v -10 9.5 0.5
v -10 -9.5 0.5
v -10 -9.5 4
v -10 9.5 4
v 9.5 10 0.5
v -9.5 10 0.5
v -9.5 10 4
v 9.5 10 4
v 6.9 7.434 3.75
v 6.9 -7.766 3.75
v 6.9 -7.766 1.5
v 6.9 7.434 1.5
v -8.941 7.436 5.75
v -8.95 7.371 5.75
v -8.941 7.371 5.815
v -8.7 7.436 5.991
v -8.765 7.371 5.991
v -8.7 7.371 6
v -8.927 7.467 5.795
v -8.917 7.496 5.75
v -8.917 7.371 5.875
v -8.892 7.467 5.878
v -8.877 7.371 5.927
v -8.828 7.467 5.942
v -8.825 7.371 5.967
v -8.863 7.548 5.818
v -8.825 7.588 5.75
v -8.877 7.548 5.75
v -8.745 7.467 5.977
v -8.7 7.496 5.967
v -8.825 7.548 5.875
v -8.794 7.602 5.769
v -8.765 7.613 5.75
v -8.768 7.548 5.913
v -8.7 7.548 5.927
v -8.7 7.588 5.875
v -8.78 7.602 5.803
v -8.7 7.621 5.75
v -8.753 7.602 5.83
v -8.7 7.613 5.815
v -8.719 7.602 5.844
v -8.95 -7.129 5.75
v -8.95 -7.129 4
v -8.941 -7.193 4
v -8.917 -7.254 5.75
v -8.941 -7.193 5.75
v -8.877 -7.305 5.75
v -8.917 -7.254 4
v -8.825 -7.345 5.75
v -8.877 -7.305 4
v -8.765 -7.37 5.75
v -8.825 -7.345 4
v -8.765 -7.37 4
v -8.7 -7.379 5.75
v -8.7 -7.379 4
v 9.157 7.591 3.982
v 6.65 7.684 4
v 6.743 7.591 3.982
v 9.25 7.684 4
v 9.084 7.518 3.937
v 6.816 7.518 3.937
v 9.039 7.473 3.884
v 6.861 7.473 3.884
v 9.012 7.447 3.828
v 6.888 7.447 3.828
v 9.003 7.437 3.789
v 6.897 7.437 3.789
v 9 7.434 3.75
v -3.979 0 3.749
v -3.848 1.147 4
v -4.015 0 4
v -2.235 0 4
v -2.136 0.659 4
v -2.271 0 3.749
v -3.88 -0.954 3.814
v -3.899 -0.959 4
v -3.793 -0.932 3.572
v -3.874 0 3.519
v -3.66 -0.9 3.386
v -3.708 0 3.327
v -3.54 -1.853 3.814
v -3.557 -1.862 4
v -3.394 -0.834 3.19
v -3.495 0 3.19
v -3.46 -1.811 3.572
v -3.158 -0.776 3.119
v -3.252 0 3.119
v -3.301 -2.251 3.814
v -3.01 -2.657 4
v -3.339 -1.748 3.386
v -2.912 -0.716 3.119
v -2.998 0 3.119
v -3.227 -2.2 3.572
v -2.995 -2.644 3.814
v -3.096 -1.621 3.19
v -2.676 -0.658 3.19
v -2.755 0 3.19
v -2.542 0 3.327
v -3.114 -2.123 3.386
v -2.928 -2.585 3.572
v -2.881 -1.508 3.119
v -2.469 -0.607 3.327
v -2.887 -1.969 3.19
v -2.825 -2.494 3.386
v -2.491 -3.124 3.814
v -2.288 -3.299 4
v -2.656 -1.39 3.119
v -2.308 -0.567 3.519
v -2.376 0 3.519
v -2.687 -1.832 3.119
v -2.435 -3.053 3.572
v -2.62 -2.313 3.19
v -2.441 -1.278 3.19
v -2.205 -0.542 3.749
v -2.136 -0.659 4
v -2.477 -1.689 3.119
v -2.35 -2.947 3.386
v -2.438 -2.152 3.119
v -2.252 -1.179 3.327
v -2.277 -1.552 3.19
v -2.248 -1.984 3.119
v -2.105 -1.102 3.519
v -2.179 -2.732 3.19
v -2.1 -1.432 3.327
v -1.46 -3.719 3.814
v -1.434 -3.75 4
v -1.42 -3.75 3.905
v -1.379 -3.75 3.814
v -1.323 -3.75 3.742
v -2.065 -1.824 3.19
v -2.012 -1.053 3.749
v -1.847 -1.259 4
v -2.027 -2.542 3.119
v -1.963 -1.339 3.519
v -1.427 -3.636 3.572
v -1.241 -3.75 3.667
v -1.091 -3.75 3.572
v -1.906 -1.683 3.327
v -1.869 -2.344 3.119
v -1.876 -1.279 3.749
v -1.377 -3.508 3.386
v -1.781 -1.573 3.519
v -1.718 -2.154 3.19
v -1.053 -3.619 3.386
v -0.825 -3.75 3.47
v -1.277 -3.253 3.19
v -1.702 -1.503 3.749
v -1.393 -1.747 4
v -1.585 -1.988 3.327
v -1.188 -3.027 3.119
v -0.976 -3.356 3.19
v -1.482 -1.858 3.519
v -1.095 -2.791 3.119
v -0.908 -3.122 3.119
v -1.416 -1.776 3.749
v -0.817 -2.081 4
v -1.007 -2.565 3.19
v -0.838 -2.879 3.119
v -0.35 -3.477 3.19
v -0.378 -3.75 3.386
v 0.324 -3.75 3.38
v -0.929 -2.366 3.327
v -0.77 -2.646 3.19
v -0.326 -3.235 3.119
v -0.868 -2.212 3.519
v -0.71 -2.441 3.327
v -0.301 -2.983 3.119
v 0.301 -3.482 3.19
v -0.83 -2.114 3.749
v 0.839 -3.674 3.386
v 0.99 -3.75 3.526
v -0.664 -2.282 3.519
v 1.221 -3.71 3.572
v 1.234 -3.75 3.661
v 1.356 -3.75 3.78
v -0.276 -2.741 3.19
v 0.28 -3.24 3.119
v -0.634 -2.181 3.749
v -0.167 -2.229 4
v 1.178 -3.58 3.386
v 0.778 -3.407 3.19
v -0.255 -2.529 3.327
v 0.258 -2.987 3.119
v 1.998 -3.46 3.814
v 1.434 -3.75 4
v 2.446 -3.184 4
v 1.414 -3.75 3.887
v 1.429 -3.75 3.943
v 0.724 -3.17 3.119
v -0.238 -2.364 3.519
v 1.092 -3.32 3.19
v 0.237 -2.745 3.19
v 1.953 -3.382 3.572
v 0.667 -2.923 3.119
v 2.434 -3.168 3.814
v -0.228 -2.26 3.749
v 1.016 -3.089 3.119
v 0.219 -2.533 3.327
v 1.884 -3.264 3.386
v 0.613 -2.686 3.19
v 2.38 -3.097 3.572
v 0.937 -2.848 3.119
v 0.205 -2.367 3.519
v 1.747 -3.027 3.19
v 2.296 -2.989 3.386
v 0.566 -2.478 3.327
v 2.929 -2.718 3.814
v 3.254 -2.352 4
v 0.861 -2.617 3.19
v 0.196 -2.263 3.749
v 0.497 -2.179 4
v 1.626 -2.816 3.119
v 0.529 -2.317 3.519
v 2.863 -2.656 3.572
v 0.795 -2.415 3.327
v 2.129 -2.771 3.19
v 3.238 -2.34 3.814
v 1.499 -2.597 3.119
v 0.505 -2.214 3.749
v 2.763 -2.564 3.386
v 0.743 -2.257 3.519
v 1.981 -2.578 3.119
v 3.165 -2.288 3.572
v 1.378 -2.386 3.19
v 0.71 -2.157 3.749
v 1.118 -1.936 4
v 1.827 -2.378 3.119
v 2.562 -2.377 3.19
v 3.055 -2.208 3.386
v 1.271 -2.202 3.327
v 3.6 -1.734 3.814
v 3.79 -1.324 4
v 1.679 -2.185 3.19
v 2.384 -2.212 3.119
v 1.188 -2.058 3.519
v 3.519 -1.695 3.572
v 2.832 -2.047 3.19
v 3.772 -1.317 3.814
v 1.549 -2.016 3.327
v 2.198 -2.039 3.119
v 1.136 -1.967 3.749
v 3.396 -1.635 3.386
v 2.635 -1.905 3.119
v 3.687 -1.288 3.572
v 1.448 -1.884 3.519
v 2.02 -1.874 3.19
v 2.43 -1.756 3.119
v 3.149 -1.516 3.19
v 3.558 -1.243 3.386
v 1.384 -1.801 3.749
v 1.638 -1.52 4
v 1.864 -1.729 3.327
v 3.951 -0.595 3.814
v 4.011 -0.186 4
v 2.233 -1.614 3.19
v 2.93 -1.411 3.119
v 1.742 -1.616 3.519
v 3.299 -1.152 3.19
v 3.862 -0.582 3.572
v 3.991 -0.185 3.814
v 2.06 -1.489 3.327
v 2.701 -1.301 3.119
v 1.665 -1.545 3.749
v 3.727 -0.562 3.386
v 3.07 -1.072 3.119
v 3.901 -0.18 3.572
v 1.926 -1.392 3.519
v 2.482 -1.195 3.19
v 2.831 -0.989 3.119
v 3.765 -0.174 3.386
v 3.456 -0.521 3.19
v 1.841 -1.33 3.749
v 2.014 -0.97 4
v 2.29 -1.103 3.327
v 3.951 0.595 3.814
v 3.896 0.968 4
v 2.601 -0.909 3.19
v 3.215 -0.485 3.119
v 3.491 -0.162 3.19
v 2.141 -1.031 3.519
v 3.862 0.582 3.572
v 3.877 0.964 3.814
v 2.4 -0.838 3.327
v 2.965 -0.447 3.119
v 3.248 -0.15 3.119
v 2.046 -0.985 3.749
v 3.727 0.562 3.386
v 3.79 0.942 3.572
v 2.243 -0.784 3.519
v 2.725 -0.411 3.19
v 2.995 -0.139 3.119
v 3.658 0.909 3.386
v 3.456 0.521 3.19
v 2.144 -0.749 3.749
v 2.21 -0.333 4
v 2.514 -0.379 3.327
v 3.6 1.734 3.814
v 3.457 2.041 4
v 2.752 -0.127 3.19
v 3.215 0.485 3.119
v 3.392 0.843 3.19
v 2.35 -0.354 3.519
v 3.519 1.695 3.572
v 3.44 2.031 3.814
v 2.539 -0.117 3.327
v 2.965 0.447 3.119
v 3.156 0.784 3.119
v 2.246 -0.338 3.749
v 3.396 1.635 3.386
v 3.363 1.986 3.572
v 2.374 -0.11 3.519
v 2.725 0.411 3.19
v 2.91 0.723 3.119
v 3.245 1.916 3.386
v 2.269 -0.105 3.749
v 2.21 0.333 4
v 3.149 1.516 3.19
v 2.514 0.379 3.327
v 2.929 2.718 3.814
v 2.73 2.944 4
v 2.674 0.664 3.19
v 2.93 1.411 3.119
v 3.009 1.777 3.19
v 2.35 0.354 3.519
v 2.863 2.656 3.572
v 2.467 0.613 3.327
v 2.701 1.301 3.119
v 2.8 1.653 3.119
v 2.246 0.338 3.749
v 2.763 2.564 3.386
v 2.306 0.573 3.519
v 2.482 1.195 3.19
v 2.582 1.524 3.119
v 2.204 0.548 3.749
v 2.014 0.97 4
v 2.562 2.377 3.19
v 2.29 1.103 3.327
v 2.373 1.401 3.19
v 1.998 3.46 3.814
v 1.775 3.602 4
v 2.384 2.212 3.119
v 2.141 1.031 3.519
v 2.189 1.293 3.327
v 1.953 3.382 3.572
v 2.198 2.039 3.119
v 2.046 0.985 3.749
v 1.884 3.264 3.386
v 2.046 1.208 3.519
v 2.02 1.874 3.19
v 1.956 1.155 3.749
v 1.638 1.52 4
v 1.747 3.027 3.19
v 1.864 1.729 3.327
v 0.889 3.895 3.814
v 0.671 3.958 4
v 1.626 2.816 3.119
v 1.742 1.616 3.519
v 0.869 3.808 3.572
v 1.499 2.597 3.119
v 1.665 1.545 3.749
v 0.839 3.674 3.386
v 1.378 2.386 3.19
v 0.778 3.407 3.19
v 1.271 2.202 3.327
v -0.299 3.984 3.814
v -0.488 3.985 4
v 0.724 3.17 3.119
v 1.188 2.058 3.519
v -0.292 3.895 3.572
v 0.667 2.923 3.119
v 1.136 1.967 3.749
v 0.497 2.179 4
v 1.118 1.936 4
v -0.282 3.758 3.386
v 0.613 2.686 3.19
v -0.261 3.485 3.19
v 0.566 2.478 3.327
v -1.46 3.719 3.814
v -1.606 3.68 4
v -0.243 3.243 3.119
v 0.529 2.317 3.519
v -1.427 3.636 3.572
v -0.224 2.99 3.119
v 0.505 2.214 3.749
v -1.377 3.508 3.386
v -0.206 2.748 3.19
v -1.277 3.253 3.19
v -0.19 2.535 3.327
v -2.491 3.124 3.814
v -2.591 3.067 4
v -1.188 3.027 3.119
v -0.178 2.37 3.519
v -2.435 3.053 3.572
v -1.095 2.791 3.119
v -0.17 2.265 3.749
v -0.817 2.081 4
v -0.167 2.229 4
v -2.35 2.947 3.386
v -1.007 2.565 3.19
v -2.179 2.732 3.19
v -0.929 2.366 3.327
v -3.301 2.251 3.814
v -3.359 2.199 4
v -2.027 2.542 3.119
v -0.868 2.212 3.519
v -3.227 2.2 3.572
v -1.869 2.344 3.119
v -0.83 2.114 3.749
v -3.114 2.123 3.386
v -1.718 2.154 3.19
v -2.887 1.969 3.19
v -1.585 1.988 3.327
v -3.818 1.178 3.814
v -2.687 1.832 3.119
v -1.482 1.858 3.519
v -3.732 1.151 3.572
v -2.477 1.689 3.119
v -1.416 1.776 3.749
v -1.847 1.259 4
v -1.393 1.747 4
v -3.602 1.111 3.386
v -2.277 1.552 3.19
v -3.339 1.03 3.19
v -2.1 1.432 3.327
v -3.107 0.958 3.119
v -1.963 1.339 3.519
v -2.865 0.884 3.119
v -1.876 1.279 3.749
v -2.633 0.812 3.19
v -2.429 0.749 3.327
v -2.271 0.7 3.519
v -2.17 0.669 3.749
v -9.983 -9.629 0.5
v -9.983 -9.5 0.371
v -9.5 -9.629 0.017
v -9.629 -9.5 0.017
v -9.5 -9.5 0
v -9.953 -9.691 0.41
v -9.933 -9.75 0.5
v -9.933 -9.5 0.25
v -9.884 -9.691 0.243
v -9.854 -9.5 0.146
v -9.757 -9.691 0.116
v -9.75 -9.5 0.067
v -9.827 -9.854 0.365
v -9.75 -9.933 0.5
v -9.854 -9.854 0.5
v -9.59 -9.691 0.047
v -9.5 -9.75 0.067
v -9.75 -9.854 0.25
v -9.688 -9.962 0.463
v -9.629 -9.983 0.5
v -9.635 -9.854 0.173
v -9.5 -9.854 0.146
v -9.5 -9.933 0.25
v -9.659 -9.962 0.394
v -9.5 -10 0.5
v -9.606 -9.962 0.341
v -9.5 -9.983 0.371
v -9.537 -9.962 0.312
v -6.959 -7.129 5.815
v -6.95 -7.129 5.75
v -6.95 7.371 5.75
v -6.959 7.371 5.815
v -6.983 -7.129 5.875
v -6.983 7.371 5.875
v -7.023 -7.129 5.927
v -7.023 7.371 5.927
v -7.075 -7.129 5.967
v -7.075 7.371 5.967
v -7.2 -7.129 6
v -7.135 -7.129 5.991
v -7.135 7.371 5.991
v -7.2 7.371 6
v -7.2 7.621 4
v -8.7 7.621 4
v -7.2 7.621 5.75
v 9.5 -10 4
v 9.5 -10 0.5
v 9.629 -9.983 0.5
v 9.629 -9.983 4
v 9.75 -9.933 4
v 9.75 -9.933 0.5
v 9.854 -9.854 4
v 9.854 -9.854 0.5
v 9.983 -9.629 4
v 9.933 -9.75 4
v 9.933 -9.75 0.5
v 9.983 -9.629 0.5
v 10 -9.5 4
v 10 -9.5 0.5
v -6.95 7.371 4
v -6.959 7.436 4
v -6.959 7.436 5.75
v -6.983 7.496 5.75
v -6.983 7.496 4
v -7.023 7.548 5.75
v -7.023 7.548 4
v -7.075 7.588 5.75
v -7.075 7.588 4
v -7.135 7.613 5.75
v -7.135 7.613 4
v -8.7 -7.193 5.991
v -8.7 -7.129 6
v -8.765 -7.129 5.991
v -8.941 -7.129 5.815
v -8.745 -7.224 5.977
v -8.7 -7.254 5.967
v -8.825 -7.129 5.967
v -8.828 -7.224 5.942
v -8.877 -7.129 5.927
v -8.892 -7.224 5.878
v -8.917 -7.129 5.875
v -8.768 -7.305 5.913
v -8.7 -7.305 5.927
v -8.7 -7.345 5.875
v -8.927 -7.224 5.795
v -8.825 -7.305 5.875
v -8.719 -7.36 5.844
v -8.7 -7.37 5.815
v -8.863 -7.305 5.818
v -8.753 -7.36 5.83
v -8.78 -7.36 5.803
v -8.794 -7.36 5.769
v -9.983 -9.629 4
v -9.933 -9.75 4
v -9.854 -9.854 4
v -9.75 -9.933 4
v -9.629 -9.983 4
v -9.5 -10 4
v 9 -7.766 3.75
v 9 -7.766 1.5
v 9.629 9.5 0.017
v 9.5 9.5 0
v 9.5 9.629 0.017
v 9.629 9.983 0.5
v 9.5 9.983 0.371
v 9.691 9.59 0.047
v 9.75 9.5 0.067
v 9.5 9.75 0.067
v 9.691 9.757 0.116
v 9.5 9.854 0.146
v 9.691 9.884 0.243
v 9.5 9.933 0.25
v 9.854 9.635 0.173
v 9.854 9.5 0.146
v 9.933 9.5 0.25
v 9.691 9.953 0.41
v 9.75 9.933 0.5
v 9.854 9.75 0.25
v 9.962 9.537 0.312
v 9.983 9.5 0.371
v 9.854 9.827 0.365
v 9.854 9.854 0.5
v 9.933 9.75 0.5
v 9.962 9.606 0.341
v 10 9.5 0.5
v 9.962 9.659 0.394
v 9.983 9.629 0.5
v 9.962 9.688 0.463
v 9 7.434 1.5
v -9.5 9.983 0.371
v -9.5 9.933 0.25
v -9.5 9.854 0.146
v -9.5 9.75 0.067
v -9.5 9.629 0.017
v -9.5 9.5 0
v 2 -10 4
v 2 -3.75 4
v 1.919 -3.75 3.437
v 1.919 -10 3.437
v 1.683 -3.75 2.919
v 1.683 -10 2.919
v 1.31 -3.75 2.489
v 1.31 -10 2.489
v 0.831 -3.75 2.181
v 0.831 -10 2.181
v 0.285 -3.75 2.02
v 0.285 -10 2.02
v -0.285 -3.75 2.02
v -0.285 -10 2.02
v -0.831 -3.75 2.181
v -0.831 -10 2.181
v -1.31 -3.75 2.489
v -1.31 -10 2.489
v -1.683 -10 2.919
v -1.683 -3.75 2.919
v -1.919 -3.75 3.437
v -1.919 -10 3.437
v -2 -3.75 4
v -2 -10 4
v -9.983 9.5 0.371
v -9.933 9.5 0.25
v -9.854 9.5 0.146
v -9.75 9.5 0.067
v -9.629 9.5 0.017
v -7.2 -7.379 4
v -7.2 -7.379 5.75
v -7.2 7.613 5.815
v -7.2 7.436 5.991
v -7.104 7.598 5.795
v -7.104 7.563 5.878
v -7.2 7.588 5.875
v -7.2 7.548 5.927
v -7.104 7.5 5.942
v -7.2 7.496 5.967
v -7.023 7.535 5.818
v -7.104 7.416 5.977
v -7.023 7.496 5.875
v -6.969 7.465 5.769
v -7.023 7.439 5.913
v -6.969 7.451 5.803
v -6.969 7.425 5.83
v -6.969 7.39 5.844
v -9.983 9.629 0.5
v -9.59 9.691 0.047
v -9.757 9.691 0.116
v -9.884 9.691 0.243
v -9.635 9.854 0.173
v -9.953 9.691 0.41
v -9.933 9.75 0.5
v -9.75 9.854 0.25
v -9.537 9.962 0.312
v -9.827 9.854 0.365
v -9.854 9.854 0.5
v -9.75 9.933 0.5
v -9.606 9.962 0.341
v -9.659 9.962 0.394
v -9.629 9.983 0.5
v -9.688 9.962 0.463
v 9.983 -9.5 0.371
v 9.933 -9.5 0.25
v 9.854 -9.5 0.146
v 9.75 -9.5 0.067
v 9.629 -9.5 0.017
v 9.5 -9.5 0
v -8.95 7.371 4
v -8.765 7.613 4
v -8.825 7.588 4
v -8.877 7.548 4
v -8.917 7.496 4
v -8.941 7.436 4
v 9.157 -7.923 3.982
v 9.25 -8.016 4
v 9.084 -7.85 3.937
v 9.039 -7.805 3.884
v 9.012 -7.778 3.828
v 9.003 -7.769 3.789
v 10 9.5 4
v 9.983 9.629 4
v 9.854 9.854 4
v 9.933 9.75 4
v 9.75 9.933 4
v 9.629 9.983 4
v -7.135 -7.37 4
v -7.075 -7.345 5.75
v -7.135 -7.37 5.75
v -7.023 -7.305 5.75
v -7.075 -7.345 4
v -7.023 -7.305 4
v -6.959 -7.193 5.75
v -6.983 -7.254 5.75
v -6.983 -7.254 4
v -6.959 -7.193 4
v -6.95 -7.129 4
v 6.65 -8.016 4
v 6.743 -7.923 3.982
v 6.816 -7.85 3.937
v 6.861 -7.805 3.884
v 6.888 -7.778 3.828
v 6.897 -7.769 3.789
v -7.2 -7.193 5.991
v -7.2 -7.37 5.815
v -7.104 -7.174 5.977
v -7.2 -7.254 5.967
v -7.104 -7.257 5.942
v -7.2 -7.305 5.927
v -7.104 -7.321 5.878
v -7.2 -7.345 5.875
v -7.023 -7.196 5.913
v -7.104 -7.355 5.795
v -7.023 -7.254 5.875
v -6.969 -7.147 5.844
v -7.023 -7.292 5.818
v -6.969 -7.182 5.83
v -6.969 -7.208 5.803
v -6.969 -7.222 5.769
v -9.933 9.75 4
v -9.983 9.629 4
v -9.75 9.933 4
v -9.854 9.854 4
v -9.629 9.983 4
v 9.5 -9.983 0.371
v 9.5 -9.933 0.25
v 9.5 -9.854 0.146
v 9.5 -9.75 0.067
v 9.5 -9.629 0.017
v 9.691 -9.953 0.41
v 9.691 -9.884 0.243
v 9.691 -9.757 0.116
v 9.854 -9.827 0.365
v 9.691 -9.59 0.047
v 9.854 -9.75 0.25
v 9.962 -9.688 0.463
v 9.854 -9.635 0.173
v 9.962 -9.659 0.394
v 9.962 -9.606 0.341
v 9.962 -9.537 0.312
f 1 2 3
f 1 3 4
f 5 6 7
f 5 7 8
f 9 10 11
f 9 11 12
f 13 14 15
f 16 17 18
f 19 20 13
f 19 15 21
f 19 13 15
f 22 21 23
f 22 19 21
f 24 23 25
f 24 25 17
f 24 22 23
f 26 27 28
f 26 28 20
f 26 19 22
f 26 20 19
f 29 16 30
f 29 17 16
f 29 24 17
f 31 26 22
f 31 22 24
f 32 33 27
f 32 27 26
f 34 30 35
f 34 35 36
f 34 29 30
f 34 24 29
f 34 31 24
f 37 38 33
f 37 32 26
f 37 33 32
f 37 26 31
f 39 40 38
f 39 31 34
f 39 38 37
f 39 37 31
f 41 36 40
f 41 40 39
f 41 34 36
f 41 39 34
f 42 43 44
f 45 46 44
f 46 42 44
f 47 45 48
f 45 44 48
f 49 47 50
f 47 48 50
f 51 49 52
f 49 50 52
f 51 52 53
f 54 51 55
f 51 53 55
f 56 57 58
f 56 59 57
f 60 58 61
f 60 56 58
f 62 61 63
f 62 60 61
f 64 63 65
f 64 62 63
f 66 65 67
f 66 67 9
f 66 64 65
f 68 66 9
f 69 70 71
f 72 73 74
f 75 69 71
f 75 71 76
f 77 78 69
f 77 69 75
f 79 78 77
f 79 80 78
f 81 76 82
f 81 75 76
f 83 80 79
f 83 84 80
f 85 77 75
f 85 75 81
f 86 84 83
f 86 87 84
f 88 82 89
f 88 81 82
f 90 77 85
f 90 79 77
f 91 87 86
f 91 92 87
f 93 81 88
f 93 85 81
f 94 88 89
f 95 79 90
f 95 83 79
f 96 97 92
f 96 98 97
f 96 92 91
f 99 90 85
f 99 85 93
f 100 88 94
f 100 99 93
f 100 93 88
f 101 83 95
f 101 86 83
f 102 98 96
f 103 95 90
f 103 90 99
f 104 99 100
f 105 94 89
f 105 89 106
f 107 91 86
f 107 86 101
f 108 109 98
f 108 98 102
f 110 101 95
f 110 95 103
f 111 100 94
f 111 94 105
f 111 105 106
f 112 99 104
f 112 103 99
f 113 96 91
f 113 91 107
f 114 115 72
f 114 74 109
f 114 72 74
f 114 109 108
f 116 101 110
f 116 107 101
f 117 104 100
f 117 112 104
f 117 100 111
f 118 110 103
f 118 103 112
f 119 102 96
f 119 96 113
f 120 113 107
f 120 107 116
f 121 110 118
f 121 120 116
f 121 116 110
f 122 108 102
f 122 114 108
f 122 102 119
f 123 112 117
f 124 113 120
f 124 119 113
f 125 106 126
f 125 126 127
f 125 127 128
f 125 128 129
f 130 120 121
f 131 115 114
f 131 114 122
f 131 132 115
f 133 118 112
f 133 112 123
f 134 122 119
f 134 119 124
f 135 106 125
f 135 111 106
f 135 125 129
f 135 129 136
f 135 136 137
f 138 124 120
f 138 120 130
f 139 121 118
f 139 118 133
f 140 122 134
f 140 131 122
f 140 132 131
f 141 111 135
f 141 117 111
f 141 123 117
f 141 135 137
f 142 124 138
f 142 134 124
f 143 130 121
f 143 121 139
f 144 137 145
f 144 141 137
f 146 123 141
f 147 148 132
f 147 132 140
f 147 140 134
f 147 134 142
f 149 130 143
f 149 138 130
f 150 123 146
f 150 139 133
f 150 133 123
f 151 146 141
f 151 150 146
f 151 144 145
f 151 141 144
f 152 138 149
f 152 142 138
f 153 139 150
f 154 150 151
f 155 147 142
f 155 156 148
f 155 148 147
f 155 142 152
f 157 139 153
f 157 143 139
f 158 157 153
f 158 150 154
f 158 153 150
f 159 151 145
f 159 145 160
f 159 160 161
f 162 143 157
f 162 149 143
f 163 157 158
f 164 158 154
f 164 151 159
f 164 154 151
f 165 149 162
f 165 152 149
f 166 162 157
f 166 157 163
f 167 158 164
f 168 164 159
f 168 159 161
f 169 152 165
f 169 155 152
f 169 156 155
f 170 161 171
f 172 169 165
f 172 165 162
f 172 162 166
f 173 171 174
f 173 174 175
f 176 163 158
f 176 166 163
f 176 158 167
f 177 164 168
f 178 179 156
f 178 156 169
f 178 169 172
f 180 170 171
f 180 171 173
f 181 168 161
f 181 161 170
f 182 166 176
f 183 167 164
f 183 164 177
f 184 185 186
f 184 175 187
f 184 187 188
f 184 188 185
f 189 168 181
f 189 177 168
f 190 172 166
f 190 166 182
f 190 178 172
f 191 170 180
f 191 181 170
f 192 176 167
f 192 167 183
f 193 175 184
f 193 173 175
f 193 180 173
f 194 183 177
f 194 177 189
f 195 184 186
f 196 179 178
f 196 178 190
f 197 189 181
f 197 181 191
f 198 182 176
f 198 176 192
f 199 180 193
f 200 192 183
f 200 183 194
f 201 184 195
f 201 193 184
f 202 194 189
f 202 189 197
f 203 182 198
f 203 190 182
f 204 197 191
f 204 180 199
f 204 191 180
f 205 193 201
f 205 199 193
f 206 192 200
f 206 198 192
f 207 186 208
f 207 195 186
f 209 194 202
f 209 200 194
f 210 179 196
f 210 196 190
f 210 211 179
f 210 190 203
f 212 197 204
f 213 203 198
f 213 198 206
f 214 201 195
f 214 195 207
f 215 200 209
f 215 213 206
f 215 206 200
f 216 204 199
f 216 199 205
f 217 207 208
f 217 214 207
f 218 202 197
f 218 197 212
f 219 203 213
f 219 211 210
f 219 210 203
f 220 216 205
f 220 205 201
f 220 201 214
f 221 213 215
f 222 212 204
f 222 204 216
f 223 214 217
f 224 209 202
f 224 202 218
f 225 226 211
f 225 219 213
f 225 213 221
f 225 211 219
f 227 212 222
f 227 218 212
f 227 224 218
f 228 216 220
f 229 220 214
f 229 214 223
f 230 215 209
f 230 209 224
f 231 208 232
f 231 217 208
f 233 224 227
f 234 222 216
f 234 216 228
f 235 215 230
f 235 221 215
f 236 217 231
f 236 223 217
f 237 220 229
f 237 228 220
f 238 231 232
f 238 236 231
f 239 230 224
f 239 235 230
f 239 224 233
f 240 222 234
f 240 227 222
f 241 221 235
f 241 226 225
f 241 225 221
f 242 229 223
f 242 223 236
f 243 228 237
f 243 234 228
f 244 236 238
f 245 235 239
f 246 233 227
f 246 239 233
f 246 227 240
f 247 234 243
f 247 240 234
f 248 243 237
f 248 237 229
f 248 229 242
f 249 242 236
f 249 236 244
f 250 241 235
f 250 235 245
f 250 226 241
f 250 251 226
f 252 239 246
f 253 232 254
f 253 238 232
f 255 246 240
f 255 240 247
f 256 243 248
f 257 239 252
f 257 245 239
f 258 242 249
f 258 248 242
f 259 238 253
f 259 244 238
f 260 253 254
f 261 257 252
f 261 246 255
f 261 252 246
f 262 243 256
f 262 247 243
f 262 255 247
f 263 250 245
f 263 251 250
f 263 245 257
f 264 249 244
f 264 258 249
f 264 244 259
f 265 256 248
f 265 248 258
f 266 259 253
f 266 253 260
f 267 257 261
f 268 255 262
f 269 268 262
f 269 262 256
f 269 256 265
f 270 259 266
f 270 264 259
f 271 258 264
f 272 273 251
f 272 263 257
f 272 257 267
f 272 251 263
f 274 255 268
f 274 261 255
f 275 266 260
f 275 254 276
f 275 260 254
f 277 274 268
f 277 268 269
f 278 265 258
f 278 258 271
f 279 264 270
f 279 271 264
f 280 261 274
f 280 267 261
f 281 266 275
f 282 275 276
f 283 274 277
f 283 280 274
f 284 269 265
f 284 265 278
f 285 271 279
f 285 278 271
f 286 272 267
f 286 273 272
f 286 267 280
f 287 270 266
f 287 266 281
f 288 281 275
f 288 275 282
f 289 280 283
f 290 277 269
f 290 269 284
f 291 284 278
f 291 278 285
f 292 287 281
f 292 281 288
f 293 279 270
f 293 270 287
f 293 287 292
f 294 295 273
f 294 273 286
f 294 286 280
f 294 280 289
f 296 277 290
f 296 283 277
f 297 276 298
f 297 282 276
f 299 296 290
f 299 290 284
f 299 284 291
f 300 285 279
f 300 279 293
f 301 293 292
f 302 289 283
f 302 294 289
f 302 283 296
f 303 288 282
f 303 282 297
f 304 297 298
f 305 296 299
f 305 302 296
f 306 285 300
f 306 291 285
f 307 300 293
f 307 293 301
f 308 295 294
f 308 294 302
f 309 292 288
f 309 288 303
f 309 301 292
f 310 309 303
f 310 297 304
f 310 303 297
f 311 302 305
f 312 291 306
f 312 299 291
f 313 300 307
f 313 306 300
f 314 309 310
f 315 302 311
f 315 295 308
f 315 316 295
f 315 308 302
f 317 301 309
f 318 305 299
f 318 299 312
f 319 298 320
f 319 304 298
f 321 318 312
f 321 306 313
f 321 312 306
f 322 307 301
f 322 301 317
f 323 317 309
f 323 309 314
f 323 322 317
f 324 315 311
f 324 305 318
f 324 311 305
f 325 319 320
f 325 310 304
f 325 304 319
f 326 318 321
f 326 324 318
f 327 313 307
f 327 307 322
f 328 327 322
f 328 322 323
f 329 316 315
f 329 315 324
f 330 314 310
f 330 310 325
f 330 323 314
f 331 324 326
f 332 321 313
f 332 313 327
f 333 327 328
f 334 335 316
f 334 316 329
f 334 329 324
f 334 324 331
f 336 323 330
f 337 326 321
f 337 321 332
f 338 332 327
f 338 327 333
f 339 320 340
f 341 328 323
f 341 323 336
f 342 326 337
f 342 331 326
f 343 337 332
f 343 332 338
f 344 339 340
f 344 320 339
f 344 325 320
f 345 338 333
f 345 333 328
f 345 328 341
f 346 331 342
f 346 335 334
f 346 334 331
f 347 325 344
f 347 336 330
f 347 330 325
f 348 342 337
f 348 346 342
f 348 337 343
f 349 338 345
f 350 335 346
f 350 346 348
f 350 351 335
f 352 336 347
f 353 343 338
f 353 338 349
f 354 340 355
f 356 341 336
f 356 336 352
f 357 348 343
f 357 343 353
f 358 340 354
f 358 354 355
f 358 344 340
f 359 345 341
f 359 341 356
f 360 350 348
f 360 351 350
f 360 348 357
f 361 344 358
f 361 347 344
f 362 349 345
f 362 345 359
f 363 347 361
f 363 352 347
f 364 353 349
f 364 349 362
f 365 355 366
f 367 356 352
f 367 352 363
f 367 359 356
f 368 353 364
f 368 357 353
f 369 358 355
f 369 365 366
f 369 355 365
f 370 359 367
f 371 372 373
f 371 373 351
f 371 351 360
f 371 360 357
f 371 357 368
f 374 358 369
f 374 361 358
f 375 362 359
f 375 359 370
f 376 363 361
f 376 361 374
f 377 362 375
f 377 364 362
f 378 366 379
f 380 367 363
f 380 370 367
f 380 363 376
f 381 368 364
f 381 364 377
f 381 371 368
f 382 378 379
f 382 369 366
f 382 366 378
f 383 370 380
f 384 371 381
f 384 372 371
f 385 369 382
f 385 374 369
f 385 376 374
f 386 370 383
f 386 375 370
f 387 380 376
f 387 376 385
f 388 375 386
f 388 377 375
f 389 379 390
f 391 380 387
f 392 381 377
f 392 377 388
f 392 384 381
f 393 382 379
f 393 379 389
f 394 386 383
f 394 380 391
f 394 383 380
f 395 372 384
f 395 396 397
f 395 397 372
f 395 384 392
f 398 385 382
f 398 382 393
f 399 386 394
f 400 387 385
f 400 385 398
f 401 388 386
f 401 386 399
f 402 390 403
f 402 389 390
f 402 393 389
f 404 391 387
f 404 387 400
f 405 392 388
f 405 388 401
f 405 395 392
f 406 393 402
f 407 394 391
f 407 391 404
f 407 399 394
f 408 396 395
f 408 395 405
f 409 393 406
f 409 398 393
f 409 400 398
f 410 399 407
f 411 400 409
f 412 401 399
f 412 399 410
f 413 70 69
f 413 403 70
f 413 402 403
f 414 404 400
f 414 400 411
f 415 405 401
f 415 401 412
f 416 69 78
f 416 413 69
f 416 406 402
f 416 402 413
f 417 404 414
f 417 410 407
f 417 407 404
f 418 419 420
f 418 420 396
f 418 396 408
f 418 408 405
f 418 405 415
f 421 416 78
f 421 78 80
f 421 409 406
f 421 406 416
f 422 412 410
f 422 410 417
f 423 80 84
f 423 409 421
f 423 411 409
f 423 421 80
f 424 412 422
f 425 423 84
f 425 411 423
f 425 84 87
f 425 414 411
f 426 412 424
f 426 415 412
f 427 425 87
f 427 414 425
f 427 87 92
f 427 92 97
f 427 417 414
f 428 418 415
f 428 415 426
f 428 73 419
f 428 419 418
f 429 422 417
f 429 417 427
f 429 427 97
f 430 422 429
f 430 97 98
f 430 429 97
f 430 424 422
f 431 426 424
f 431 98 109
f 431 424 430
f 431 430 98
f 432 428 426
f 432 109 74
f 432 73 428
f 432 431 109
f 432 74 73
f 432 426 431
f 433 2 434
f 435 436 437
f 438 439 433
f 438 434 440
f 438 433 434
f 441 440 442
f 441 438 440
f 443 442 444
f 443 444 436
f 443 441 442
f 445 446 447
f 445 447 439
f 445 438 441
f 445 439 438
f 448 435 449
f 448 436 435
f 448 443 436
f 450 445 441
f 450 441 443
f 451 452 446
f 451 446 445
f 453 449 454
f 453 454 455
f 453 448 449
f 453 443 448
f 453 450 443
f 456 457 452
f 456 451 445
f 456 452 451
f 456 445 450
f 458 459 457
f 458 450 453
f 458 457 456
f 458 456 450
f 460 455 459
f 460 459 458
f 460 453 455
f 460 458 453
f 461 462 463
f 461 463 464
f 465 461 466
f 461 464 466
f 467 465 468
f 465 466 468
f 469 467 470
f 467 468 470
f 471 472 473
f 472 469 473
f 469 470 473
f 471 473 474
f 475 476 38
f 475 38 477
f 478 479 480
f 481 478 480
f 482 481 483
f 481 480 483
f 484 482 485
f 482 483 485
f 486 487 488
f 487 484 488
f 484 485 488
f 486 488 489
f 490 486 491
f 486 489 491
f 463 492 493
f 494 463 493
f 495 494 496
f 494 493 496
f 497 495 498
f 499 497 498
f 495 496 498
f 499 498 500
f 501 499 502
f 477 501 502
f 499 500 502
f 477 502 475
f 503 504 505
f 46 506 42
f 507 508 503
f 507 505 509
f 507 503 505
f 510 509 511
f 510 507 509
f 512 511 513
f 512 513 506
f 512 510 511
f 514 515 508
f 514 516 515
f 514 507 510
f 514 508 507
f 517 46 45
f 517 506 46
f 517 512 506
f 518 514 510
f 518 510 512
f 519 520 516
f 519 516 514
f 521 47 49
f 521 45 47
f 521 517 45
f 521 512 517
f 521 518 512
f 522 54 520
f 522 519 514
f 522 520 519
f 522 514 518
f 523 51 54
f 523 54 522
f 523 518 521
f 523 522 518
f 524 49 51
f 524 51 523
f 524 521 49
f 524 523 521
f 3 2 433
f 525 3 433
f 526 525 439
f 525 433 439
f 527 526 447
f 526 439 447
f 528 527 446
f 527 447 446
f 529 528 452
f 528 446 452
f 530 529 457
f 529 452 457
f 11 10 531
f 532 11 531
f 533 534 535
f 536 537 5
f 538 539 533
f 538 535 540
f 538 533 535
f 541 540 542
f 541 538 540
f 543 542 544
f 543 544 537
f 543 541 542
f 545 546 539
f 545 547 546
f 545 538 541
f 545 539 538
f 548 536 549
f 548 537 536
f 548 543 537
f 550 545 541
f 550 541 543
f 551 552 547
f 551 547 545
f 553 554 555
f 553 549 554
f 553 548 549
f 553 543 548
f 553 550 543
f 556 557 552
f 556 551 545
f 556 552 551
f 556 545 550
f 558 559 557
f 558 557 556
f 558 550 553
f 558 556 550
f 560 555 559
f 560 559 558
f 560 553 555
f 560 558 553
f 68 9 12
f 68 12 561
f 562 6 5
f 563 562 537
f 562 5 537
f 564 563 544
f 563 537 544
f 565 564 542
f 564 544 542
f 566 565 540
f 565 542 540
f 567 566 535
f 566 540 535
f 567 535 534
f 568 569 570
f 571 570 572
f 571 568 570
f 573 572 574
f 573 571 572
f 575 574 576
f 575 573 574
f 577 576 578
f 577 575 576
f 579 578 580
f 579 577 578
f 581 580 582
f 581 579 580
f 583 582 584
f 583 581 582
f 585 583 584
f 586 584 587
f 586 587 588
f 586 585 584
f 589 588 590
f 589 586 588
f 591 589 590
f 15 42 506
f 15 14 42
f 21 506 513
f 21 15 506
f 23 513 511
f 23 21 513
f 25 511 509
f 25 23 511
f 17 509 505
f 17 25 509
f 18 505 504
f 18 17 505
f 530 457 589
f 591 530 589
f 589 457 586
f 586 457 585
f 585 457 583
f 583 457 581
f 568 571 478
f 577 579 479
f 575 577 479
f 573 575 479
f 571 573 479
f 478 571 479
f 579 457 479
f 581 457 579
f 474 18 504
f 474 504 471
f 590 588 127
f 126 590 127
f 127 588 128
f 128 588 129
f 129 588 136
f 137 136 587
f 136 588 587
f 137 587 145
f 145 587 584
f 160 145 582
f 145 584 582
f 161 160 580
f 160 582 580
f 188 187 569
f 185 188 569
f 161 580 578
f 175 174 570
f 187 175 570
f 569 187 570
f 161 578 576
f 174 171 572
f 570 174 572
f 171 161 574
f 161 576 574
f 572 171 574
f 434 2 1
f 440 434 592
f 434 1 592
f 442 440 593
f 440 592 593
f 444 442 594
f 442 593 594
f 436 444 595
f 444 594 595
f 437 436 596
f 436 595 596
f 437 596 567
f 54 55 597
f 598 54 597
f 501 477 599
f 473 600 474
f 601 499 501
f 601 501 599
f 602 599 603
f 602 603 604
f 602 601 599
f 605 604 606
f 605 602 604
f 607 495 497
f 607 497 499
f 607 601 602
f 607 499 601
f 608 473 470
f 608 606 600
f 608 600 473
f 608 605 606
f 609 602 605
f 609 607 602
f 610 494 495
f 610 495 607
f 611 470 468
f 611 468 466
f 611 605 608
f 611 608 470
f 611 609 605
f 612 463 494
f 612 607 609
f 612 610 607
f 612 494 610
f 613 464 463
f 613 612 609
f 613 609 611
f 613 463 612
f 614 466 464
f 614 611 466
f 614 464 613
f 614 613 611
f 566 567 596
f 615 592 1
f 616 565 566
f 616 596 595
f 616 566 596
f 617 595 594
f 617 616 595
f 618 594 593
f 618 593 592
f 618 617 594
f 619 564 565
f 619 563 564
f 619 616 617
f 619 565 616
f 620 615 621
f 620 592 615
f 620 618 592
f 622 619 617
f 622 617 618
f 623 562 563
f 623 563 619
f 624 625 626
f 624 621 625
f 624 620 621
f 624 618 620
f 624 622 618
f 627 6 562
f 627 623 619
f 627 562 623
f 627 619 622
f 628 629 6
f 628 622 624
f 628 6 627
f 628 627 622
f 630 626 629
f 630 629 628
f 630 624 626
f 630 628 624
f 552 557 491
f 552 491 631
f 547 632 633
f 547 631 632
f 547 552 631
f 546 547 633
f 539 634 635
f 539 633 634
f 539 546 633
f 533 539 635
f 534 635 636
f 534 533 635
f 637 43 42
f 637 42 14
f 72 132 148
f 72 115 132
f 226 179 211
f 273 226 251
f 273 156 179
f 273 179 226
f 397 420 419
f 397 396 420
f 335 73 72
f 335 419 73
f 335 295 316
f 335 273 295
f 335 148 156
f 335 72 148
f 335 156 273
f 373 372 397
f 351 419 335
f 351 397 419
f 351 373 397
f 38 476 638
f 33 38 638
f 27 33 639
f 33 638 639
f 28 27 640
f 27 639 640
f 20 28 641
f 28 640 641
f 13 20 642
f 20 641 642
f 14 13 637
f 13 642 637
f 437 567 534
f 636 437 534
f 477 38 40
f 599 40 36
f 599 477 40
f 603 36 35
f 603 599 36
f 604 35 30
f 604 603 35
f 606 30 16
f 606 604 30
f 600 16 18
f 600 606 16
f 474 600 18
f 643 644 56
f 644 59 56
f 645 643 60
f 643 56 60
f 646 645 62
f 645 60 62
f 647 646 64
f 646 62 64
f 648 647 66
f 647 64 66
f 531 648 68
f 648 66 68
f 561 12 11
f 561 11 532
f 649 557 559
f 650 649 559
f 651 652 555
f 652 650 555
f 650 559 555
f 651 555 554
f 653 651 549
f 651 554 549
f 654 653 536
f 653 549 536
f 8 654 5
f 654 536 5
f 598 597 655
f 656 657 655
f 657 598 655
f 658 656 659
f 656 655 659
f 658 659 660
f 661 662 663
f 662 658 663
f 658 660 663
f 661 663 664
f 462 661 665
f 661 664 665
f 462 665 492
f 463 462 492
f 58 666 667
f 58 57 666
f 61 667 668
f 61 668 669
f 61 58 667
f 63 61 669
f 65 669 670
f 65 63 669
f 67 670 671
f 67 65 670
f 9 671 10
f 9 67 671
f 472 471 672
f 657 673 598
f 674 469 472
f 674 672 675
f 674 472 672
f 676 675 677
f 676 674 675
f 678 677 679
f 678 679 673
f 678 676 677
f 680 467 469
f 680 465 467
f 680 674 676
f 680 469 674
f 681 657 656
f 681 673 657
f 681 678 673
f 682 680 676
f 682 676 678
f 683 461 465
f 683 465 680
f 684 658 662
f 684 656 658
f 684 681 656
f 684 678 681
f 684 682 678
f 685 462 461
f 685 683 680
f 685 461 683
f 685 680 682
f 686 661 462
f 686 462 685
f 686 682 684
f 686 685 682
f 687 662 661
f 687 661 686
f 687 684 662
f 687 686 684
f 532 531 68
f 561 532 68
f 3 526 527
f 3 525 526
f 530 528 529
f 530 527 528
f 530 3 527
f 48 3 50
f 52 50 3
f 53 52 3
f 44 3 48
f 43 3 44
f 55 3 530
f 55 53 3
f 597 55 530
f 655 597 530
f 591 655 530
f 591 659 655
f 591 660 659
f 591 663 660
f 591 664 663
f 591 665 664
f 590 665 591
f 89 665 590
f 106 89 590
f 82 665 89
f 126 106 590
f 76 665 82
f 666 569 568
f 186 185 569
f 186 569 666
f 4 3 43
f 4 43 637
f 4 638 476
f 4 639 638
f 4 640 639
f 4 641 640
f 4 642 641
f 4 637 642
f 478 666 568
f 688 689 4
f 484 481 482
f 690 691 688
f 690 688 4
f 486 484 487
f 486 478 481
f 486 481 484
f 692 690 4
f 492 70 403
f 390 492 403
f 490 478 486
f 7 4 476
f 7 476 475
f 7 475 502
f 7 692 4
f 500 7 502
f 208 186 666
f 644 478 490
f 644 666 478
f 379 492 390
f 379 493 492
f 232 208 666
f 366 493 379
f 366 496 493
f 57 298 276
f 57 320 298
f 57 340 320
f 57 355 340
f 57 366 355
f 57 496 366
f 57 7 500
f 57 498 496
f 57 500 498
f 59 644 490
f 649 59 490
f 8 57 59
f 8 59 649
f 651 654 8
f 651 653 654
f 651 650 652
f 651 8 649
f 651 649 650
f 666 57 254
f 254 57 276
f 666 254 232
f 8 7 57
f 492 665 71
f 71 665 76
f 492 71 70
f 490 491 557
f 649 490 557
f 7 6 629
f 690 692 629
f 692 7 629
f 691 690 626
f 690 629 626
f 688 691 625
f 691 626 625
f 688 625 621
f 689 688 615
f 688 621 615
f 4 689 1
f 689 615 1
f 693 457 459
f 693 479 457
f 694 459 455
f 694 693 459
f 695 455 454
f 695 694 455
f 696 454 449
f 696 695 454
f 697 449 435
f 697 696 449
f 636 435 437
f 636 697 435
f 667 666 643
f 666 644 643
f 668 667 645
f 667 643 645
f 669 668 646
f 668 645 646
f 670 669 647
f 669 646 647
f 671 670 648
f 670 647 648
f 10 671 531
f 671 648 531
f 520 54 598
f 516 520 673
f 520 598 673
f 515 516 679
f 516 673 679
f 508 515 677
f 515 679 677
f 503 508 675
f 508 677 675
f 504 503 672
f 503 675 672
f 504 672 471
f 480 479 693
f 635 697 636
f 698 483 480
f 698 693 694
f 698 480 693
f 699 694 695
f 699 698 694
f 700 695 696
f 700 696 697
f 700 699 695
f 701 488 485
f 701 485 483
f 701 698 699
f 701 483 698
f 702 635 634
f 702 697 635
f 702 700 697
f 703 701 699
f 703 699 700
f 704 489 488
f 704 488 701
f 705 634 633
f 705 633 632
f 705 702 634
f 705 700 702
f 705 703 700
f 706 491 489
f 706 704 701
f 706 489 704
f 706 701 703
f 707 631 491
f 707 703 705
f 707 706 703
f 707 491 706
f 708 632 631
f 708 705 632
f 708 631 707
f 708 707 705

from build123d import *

# Parameters (mm, degrees)
SKETCH1_W               = 20
SKETCH1_H               = 20
BOSS_EXTRUDE1_DEPTH     = 4
SKETCH4_R               = 0.89
CUT_EXTRUDE1_DEPTH      = 0.25
CUT_EXTRUDE1_DEPTH_BACK = 8
SKETCH6_R               = 2
SKETCH7_W               = 2
SKETCH7_H               = 15
BOSS_EXTRUDE2_DEPTH     = 2
SKETCH8_W               = 2.1
SKETCH8_H               = 15.2
CUT_EXTRUDE2_DEPTH      = 2.5
FILLET1_R               = 0.25
FILLET2_R               = 0.25
FILLET3_R               = 0.25
FILLET5_R               = 0.5
FILLET6_R               = 0.5


with BuildPart() as part:
    # Sketch1 → Boss-Extrude1 (new body)
    with BuildSketch(Plane.XY):
        Rectangle(SKETCH1_W, SKETCH1_H)
    extrude(amount=BOSS_EXTRUDE1_DEPTH)

    # Sketch4 → Cut-Revolve1 (revolve, cut)
    with BuildSketch(Plane(origin=(0, 0, 0), x_dir=(1, 0, 0), z_dir=(0, 1, 0)), mode=Mode.PRIVATE) as cut_revolve1_sk:
        with Locations((3.125, -4)):
            Circle(SKETCH4_R)
    revolve(cut_revolve1_sk.sketch.rotate(Axis((0, 0, 0), (0, 0, 1)), 180), axis=Axis((0, 0, 0), (0, 0, 1)), mode=Mode.SUBTRACT)

    # Sketch6 → Cut-Extrude1 (cut, two sides: drawn at the far end of the back side and taken through both)
    with BuildSketch(Plane(origin=(0, -4, 0), x_dir=(1, 0, 0), z_dir=(0, 1, 0)).offset(-CUT_EXTRUDE1_DEPTH_BACK)):
        with Locations((0, -4)):
            Circle(SKETCH6_R)
    extrude(amount=CUT_EXTRUDE1_DEPTH + CUT_EXTRUDE1_DEPTH_BACK, mode=Mode.SUBTRACT)

    # Sketch7 → Boss-Extrude2 (add)
    with BuildSketch(Plane.XY.offset(4)):
        with Locations((-7.95, 0.121431972)):
            Rectangle(SKETCH7_W, SKETCH7_H)
    extrude(amount=BOSS_EXTRUDE2_DEPTH)

    # Sketch8 → Cut-Extrude2 (cut)
    with BuildSketch(Plane.XY.offset(4)):
        with Locations((7.95, -0.165781366)):
            Rectangle(SKETCH8_W, SKETCH8_H)
    extrude(amount=-CUT_EXTRUDE2_DEPTH, mode=Mode.SUBTRACT)

    # Fillet1
    fillet1_edges = [part.edges().sort_by_distance(p)[0] for p in [
        (-8.95, 0.121431972, 6),
        (-7.95, -7.378568028, 6),
        (-6.95, 0.121431972, 6),
        (-7.95, 7.621431972, 6),
    ]]
    fillet(fillet1_edges, radius=FILLET1_R)

    # Fillet2
    # the kernel refuses this fillet: 0.25 mm, written as the material it takes off along each edge
    with BuildSketch(Plane(origin=(-7.2, -7.128568028, 5.75), x_dir=(0, -1, 0), z_dir=(1, 0, 0))) as fillet2_piece_1_section:
        Polygon((0, 0), (FILLET2_R, 0), (FILLET2_R, -FILLET2_R), (0, -FILLET2_R), align=None)
    fillet2_piece_1 = extrude(amount=FILLET2_R, mode=Mode.PRIVATE)
    fillet2_piece_1 = fillet2_piece_1 - Plane(origin=(-7.2, -7.128568028, 5.75), x_dir=(0, 0.7071067811865475, -0.7071067811865475), z_dir=(1, 0, 0)) * Sphere(FILLET2_R, mode=Mode.PRIVATE)
    add(fillet2_piece_1, mode=Mode.SUBTRACT)
    with BuildSketch(Plane(origin=(-8.7, -7.128568028, 5.75), x_dir=(-1, 0, 0), z_dir=(0, -1, 0))) as fillet2_piece_2_section:
        Polygon((0, 0), (FILLET2_R, 0), (FILLET2_R, -FILLET2_R), (0, -FILLET2_R), align=None)
    fillet2_piece_2 = extrude(amount=FILLET2_R, mode=Mode.PRIVATE)
    fillet2_piece_2 = fillet2_piece_2 - Plane(origin=(-8.7, -7.128568028, 5.75), x_dir=(0.7071067811865475, 0, -0.7071067811865475), z_dir=(0, -1, 0)) * Sphere(FILLET2_R, mode=Mode.PRIVATE)
    add(fillet2_piece_2, mode=Mode.SUBTRACT)
    with BuildSketch(Plane(origin=(-7.2, 7.371431972, 5.75), x_dir=(0, 1, 0), z_dir=(1, 0, 0))) as fillet2_piece_3_section:
        Polygon((0, 0), (FILLET2_R, 0), (FILLET2_R, FILLET2_R), (0, FILLET2_R), align=None)
    fillet2_piece_3 = extrude(amount=FILLET2_R, mode=Mode.PRIVATE)
    fillet2_piece_3 = fillet2_piece_3 - Plane(origin=(-7.2, 7.371431972, 5.75), x_dir=(0, -0.7071067811865475, -0.7071067811865475), z_dir=(1, 0, 0)) * Sphere(FILLET2_R, mode=Mode.PRIVATE)
    add(fillet2_piece_3, mode=Mode.SUBTRACT)
    with BuildSketch(Plane(origin=(-8.7, 7.371431972, 5.75), x_dir=(-1, 0, 0), z_dir=(0, 1, 0))) as fillet2_piece_4_section:
        Polygon((0, 0), (FILLET2_R, 0), (FILLET2_R, FILLET2_R), (0, FILLET2_R), align=None)
    fillet2_piece_4 = extrude(amount=FILLET2_R, mode=Mode.PRIVATE)
    fillet2_piece_4 = fillet2_piece_4 - Plane(origin=(-8.7, 7.371431972, 5.75), x_dir=(0.7071067811865475, 0, -0.7071067811865475), z_dir=(0, 1, 0)) * Sphere(FILLET2_R, mode=Mode.PRIVATE)
    add(fillet2_piece_4, mode=Mode.SUBTRACT)
    with BuildSketch(Plane(origin=(-8.95, 7.621431972, 4), x_dir=(1, 0, 0), z_dir=(0, 0, 1)), Plane(origin=(-6.95, 7.621431972, 4), x_dir=(0, -1, 0), z_dir=(0, 0, 1))) as fillet2_piece_5:
        with BuildLine():
            CenterArc((FILLET2_R, -FILLET2_R), FILLET2_R, 90, 90)
            Line((0, -FILLET2_R), (0, 0))
            Line((0, 0), (FILLET2_R, 0))
        make_face()
    extrude(amount=1.75, mode=Mode.SUBTRACT)
    with BuildSketch(Plane(origin=(-6.95, -7.378568028, 4), x_dir=(0, 1, 0), z_dir=(0, 0, 1)), Plane(origin=(-8.95, -7.378568028, 4), x_dir=(1, 0, 0), z_dir=(0, 0, 1))) as fillet2_piece_6:
        with BuildLine():
            CenterArc((FILLET2_R, FILLET2_R), FILLET2_R, 180, 90)
            Line((0, FILLET2_R), (0, 0))
            Line((0, 0), (FILLET2_R, 0))
        make_face()
    extrude(amount=1.75, mode=Mode.SUBTRACT)

    # Fillet3
    fillet3_edges = [part.edges().sort_by_distance(p)[0] for p in [
        (6.9, -0.165781366, 4),
        (7.95, -7.765781366, 4),
        (9, -0.165781366, 4),
        (7.95, 7.434218634, 4),
    ]]
    fillet(fillet3_edges, radius=FILLET3_R)

    # Fillet5
    fillet5_edges = [part.edges().sort_by_distance(p)[0] for p in [
        (0, 10, 0),
        (10, 0, 0),
        (0, -10, 0),
        (-10, 0, 0),
    ]]
    fillet(fillet5_edges, radius=FILLET5_R)

    # Fillet6
    # the kernel refuses this fillet: 0.5 mm, written as the material it takes off along each edge
    with BuildSketch(Plane(origin=(-9.5, 9.5, 0.5), x_dir=(-1, 0, 0), z_dir=(0, 1, 0))) as fillet6_piece_1_section:
        Polygon((0, 0), (FILLET6_R, 0), (FILLET6_R, -FILLET6_R), (0, -FILLET6_R), align=None)
    fillet6_piece_1 = extrude(amount=FILLET6_R, mode=Mode.PRIVATE)
    fillet6_piece_1 = fillet6_piece_1 - Plane(origin=(-9.5, 9.5, 0.5), x_dir=(0.7071067811865475, 0, 0.7071067811865475), z_dir=(0, 1, 0)) * Sphere(FILLET6_R, mode=Mode.PRIVATE)
    add(fillet6_piece_1, mode=Mode.SUBTRACT)
    with BuildSketch(Plane(origin=(9.5, 9.5, 0.5), x_dir=(0, 1, 0), z_dir=(1, 0, 0))) as fillet6_piece_2_section:
        Polygon((0, 0), (FILLET6_R, 0), (FILLET6_R, -FILLET6_R), (0, -FILLET6_R), align=None)
    fillet6_piece_2 = extrude(amount=FILLET6_R, mode=Mode.PRIVATE)
    fillet6_piece_2 = fillet6_piece_2 - Plane(origin=(9.5, 9.5, 0.5), x_dir=(0, -0.7071067811865475, 0.7071067811865475), z_dir=(1, 0, 0)) * Sphere(FILLET6_R, mode=Mode.PRIVATE)
    add(fillet6_piece_2, mode=Mode.SUBTRACT)
    with BuildSketch(Plane(origin=(-9.5, -9.5, 0.5), x_dir=(-1, 0, 0), z_dir=(0, -1, 0))) as fillet6_piece_3_section:
        Polygon((0, 0), (FILLET6_R, 0), (FILLET6_R, FILLET6_R), (0, FILLET6_R), align=None)
    fillet6_piece_3 = extrude(amount=FILLET6_R, mode=Mode.PRIVATE)
    fillet6_piece_3 = fillet6_piece_3 - Plane(origin=(-9.5, -9.5, 0.5), x_dir=(0.7071067811865475, 0, 0.7071067811865475), z_dir=(0, -1, 0)) * Sphere(FILLET6_R, mode=Mode.PRIVATE)
    add(fillet6_piece_3, mode=Mode.SUBTRACT)
    with BuildSketch(Plane(origin=(9.5, -9.5, 0.5), x_dir=(0, -1, 0), z_dir=(1, 0, 0))) as fillet6_piece_4_section:
        Polygon((0, 0), (FILLET6_R, 0), (FILLET6_R, FILLET6_R), (0, FILLET6_R), align=None)
    fillet6_piece_4 = extrude(amount=FILLET6_R, mode=Mode.PRIVATE)
    fillet6_piece_4 = fillet6_piece_4 - Plane(origin=(9.5, -9.5, 0.5), x_dir=(0, 0.7071067811865475, 0.7071067811865475), z_dir=(1, 0, 0)) * Sphere(FILLET6_R, mode=Mode.PRIVATE)
    add(fillet6_piece_4, mode=Mode.SUBTRACT)
    with BuildSketch(Plane(origin=(-10, 10, 0.5), x_dir=(1, 0, 0), z_dir=(0, 0, 1)), Plane(origin=(10, 10, 0.5), x_dir=(0, -1, 0), z_dir=(0, 0, 1))) as fillet6_piece_5:
        with BuildLine():
            CenterArc((FILLET6_R, -FILLET6_R), FILLET6_R, 90, 90)
            Line((0, -FILLET6_R), (0, 0))
            Line((0, 0), (FILLET6_R, 0))
        make_face()
    extrude(amount=4.75, mode=Mode.SUBTRACT)
    with BuildSketch(Plane(origin=(10, -10, 0.5), x_dir=(0, 1, 0), z_dir=(0, 0, 1)), Plane(origin=(-10, -10, 0.5), x_dir=(1, 0, 0), z_dir=(0, 0, 1))) as fillet6_piece_6:
        with BuildLine():
            CenterArc((FILLET6_R, FILLET6_R), FILLET6_R, 180, 90)
            Line((0, FILLET6_R), (0, 0))
            Line((0, 0), (FILLET6_R, 0))
        make_face()
    extrude(amount=4.75, mode=Mode.SUBTRACT)


solid = part.part
